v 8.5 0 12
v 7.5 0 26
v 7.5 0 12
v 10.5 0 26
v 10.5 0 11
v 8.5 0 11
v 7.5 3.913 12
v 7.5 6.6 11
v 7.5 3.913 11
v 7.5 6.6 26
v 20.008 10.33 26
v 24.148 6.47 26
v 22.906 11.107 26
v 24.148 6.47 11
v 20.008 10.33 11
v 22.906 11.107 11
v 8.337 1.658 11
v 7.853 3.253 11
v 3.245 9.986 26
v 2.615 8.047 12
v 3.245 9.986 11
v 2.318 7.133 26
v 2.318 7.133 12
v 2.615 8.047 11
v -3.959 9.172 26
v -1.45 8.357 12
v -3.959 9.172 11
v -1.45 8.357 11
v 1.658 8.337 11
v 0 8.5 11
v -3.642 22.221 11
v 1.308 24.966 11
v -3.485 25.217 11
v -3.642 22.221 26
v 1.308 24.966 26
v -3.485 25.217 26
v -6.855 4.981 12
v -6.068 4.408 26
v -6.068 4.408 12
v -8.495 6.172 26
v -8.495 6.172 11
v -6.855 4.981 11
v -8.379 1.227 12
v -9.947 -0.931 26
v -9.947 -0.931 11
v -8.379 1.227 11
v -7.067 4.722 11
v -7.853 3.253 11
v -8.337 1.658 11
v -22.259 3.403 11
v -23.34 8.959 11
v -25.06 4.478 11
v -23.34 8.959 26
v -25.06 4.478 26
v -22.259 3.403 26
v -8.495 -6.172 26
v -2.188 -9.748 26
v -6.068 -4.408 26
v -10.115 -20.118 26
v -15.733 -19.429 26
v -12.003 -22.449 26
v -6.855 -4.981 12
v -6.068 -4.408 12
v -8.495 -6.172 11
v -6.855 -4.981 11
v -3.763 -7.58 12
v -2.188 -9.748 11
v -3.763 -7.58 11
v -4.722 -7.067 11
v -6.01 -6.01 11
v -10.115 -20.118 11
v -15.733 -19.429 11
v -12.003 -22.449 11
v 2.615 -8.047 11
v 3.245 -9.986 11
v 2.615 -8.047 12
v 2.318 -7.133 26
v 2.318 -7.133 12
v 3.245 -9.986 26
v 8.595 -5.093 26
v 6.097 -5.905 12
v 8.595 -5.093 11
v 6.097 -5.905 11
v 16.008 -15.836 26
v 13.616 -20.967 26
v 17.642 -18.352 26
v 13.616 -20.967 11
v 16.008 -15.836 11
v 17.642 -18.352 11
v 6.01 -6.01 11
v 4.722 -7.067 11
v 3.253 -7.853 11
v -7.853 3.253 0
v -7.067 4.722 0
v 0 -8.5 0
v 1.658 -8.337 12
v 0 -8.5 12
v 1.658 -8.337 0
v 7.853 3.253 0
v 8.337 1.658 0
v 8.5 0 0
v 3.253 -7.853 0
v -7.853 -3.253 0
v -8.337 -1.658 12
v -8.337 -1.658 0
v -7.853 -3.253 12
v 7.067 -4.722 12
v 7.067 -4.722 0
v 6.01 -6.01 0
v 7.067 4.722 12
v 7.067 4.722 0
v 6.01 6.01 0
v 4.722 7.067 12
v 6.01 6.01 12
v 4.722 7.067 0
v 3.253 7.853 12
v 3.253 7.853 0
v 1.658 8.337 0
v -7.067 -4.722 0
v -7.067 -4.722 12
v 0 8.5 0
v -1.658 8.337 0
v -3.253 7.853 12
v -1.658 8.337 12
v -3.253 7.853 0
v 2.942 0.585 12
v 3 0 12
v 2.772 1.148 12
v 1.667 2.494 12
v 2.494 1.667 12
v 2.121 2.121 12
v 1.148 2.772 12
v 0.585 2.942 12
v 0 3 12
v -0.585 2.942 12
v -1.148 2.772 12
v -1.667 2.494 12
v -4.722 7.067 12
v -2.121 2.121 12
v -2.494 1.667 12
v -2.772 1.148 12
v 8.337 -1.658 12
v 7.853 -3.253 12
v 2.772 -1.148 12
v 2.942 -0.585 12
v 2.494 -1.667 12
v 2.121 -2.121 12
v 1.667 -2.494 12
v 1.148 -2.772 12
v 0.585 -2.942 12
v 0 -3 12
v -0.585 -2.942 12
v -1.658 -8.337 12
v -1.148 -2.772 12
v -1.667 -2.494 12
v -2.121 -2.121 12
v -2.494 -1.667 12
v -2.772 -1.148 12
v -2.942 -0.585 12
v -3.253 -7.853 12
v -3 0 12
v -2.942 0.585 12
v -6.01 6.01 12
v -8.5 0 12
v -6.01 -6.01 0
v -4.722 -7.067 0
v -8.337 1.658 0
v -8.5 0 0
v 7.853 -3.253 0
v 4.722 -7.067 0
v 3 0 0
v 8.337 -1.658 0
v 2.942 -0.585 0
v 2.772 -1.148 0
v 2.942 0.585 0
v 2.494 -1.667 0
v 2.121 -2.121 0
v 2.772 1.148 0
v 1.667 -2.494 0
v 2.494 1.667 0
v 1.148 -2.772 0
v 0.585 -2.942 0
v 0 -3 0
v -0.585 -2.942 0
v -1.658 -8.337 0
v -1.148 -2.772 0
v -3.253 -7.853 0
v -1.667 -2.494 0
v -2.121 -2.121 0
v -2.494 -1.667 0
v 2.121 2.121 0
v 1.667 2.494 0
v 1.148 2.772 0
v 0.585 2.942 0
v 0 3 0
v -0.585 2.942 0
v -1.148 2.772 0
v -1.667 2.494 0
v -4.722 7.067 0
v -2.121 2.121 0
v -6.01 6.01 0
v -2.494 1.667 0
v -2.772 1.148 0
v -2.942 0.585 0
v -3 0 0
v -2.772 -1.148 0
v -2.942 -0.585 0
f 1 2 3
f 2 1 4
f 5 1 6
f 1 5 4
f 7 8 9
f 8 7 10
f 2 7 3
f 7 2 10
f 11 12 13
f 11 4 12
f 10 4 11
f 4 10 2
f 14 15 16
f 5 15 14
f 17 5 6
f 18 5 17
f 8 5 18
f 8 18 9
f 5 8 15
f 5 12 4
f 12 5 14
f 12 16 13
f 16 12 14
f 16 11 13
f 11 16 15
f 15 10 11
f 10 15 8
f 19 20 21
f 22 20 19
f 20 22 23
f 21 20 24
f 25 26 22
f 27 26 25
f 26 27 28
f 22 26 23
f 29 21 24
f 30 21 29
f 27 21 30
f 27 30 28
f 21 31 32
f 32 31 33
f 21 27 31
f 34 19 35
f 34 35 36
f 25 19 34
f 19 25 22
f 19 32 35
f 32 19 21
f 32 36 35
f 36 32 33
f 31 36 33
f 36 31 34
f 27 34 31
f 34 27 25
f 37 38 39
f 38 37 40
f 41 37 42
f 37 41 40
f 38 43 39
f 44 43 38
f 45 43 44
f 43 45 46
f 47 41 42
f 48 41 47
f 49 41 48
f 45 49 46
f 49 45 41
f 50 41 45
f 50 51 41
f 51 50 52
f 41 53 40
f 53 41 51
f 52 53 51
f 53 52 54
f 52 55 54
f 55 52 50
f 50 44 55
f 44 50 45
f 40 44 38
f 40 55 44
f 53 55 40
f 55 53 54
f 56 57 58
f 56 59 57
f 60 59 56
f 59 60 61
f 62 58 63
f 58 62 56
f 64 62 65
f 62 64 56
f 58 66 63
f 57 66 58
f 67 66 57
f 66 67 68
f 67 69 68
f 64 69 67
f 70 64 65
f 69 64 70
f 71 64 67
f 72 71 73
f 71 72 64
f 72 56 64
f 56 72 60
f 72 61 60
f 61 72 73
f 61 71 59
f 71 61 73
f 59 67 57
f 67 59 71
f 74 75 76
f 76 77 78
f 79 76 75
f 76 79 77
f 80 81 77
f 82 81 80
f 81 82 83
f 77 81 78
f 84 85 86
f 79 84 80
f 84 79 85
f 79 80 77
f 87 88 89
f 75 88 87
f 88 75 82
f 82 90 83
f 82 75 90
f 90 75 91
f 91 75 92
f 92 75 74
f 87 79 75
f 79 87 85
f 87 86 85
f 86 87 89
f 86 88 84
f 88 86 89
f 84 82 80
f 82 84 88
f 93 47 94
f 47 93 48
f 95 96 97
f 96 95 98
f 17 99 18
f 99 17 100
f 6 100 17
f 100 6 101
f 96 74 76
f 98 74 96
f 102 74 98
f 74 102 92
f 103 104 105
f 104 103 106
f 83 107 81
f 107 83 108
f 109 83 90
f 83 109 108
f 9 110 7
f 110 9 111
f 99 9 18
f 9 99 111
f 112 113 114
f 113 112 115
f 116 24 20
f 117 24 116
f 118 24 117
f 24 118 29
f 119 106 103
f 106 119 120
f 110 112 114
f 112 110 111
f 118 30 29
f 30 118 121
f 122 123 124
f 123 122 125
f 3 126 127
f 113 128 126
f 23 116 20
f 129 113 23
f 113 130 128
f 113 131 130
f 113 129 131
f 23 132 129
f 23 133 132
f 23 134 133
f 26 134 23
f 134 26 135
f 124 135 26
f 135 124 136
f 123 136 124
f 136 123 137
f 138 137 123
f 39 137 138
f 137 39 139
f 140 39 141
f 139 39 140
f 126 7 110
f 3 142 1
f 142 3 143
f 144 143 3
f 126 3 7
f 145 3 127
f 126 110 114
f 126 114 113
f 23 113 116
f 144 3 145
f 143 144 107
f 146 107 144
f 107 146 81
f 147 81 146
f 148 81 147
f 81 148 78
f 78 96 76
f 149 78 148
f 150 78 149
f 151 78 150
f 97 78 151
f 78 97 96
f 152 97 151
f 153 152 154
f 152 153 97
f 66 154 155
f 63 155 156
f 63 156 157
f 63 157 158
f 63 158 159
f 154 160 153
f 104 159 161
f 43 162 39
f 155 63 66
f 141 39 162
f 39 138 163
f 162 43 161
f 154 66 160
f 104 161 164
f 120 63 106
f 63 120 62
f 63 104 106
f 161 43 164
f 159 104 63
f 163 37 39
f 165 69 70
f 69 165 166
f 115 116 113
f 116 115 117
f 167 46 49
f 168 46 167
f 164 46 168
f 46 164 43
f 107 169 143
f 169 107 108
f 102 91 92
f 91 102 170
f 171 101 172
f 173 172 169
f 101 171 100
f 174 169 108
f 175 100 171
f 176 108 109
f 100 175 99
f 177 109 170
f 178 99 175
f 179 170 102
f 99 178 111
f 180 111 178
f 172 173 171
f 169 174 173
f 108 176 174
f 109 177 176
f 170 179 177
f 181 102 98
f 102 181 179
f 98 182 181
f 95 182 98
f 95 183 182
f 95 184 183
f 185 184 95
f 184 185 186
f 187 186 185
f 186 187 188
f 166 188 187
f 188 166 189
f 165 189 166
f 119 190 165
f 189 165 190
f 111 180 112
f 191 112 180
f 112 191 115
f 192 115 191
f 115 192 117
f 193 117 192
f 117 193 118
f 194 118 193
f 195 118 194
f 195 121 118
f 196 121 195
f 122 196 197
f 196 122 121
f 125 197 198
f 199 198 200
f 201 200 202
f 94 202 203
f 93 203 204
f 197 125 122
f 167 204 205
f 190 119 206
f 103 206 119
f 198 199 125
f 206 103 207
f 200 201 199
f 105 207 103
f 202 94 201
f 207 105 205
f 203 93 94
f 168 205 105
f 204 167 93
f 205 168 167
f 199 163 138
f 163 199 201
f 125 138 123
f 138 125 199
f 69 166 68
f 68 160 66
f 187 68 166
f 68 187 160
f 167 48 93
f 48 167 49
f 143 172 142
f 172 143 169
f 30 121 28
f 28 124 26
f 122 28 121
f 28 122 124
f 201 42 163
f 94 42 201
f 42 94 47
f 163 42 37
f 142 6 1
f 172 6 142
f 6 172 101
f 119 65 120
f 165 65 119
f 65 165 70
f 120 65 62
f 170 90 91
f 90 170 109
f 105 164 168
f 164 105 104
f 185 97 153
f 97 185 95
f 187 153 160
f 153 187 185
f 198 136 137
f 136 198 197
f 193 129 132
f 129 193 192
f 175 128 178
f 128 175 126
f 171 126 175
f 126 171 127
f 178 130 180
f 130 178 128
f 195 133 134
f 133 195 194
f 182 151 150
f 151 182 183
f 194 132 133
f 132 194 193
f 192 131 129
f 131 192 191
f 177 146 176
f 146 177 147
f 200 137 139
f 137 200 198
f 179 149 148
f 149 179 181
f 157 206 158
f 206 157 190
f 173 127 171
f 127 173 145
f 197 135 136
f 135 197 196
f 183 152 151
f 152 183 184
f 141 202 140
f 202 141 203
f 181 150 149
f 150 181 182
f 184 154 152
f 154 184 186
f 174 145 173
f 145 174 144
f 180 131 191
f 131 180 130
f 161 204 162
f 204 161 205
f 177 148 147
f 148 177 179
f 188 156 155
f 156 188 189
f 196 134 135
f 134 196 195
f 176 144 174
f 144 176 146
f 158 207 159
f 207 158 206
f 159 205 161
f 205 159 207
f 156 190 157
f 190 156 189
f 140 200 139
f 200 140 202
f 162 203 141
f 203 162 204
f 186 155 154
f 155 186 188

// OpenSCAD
$fn = 32;

// ----------------------------------------------------------------------
// Impeller: 50 mm, 5 blades, 26 mm tall
// ----------------------------------------------------------------------

// --- parameters (mm) ---
center_d = 17;            // hub diameter
center_h = 12;            // hub height
wheel_d = 50;             // outer diameter over the blades
blade_count = 5;          // number of blades
blade_t = 3;              // blade thickness
blade_h = 14;             // blade height
blade_in_r = 7.5;         // blade root radius
blade_out_r = 22;         // blade tip radius
sweep = 15;               // blade sweep, degrees
bore_d = 6;               // shaft bore

module hub() {
  cylinder(h = center_h, d = center_d);
}

module blade() {
  /* blade swept between two boxes: hull of the root and the tip section */
  hull() {
    translate([blade_in_r, 0, center_h - 1])
      cube([blade_t, blade_t * 2.2, blade_h + 1], center = false);
    rotate([0, 0, sweep])
      translate([blade_out_r, 0, center_h - 1])
        cube([blade_t, blade_t * 1.6, blade_h + 1], center = false);
  }
}

module blades() {
  for (i = [0 : blade_count - 1])
    rotate([0, 0, i * 360 / blade_count]) blade();
}

difference() {
  union() {
    hub();
    blades();
  }
  translate([0, 0, -1]) cylinder(h = center_h + blade_h + 0 + 3, d = bore_d);
}
